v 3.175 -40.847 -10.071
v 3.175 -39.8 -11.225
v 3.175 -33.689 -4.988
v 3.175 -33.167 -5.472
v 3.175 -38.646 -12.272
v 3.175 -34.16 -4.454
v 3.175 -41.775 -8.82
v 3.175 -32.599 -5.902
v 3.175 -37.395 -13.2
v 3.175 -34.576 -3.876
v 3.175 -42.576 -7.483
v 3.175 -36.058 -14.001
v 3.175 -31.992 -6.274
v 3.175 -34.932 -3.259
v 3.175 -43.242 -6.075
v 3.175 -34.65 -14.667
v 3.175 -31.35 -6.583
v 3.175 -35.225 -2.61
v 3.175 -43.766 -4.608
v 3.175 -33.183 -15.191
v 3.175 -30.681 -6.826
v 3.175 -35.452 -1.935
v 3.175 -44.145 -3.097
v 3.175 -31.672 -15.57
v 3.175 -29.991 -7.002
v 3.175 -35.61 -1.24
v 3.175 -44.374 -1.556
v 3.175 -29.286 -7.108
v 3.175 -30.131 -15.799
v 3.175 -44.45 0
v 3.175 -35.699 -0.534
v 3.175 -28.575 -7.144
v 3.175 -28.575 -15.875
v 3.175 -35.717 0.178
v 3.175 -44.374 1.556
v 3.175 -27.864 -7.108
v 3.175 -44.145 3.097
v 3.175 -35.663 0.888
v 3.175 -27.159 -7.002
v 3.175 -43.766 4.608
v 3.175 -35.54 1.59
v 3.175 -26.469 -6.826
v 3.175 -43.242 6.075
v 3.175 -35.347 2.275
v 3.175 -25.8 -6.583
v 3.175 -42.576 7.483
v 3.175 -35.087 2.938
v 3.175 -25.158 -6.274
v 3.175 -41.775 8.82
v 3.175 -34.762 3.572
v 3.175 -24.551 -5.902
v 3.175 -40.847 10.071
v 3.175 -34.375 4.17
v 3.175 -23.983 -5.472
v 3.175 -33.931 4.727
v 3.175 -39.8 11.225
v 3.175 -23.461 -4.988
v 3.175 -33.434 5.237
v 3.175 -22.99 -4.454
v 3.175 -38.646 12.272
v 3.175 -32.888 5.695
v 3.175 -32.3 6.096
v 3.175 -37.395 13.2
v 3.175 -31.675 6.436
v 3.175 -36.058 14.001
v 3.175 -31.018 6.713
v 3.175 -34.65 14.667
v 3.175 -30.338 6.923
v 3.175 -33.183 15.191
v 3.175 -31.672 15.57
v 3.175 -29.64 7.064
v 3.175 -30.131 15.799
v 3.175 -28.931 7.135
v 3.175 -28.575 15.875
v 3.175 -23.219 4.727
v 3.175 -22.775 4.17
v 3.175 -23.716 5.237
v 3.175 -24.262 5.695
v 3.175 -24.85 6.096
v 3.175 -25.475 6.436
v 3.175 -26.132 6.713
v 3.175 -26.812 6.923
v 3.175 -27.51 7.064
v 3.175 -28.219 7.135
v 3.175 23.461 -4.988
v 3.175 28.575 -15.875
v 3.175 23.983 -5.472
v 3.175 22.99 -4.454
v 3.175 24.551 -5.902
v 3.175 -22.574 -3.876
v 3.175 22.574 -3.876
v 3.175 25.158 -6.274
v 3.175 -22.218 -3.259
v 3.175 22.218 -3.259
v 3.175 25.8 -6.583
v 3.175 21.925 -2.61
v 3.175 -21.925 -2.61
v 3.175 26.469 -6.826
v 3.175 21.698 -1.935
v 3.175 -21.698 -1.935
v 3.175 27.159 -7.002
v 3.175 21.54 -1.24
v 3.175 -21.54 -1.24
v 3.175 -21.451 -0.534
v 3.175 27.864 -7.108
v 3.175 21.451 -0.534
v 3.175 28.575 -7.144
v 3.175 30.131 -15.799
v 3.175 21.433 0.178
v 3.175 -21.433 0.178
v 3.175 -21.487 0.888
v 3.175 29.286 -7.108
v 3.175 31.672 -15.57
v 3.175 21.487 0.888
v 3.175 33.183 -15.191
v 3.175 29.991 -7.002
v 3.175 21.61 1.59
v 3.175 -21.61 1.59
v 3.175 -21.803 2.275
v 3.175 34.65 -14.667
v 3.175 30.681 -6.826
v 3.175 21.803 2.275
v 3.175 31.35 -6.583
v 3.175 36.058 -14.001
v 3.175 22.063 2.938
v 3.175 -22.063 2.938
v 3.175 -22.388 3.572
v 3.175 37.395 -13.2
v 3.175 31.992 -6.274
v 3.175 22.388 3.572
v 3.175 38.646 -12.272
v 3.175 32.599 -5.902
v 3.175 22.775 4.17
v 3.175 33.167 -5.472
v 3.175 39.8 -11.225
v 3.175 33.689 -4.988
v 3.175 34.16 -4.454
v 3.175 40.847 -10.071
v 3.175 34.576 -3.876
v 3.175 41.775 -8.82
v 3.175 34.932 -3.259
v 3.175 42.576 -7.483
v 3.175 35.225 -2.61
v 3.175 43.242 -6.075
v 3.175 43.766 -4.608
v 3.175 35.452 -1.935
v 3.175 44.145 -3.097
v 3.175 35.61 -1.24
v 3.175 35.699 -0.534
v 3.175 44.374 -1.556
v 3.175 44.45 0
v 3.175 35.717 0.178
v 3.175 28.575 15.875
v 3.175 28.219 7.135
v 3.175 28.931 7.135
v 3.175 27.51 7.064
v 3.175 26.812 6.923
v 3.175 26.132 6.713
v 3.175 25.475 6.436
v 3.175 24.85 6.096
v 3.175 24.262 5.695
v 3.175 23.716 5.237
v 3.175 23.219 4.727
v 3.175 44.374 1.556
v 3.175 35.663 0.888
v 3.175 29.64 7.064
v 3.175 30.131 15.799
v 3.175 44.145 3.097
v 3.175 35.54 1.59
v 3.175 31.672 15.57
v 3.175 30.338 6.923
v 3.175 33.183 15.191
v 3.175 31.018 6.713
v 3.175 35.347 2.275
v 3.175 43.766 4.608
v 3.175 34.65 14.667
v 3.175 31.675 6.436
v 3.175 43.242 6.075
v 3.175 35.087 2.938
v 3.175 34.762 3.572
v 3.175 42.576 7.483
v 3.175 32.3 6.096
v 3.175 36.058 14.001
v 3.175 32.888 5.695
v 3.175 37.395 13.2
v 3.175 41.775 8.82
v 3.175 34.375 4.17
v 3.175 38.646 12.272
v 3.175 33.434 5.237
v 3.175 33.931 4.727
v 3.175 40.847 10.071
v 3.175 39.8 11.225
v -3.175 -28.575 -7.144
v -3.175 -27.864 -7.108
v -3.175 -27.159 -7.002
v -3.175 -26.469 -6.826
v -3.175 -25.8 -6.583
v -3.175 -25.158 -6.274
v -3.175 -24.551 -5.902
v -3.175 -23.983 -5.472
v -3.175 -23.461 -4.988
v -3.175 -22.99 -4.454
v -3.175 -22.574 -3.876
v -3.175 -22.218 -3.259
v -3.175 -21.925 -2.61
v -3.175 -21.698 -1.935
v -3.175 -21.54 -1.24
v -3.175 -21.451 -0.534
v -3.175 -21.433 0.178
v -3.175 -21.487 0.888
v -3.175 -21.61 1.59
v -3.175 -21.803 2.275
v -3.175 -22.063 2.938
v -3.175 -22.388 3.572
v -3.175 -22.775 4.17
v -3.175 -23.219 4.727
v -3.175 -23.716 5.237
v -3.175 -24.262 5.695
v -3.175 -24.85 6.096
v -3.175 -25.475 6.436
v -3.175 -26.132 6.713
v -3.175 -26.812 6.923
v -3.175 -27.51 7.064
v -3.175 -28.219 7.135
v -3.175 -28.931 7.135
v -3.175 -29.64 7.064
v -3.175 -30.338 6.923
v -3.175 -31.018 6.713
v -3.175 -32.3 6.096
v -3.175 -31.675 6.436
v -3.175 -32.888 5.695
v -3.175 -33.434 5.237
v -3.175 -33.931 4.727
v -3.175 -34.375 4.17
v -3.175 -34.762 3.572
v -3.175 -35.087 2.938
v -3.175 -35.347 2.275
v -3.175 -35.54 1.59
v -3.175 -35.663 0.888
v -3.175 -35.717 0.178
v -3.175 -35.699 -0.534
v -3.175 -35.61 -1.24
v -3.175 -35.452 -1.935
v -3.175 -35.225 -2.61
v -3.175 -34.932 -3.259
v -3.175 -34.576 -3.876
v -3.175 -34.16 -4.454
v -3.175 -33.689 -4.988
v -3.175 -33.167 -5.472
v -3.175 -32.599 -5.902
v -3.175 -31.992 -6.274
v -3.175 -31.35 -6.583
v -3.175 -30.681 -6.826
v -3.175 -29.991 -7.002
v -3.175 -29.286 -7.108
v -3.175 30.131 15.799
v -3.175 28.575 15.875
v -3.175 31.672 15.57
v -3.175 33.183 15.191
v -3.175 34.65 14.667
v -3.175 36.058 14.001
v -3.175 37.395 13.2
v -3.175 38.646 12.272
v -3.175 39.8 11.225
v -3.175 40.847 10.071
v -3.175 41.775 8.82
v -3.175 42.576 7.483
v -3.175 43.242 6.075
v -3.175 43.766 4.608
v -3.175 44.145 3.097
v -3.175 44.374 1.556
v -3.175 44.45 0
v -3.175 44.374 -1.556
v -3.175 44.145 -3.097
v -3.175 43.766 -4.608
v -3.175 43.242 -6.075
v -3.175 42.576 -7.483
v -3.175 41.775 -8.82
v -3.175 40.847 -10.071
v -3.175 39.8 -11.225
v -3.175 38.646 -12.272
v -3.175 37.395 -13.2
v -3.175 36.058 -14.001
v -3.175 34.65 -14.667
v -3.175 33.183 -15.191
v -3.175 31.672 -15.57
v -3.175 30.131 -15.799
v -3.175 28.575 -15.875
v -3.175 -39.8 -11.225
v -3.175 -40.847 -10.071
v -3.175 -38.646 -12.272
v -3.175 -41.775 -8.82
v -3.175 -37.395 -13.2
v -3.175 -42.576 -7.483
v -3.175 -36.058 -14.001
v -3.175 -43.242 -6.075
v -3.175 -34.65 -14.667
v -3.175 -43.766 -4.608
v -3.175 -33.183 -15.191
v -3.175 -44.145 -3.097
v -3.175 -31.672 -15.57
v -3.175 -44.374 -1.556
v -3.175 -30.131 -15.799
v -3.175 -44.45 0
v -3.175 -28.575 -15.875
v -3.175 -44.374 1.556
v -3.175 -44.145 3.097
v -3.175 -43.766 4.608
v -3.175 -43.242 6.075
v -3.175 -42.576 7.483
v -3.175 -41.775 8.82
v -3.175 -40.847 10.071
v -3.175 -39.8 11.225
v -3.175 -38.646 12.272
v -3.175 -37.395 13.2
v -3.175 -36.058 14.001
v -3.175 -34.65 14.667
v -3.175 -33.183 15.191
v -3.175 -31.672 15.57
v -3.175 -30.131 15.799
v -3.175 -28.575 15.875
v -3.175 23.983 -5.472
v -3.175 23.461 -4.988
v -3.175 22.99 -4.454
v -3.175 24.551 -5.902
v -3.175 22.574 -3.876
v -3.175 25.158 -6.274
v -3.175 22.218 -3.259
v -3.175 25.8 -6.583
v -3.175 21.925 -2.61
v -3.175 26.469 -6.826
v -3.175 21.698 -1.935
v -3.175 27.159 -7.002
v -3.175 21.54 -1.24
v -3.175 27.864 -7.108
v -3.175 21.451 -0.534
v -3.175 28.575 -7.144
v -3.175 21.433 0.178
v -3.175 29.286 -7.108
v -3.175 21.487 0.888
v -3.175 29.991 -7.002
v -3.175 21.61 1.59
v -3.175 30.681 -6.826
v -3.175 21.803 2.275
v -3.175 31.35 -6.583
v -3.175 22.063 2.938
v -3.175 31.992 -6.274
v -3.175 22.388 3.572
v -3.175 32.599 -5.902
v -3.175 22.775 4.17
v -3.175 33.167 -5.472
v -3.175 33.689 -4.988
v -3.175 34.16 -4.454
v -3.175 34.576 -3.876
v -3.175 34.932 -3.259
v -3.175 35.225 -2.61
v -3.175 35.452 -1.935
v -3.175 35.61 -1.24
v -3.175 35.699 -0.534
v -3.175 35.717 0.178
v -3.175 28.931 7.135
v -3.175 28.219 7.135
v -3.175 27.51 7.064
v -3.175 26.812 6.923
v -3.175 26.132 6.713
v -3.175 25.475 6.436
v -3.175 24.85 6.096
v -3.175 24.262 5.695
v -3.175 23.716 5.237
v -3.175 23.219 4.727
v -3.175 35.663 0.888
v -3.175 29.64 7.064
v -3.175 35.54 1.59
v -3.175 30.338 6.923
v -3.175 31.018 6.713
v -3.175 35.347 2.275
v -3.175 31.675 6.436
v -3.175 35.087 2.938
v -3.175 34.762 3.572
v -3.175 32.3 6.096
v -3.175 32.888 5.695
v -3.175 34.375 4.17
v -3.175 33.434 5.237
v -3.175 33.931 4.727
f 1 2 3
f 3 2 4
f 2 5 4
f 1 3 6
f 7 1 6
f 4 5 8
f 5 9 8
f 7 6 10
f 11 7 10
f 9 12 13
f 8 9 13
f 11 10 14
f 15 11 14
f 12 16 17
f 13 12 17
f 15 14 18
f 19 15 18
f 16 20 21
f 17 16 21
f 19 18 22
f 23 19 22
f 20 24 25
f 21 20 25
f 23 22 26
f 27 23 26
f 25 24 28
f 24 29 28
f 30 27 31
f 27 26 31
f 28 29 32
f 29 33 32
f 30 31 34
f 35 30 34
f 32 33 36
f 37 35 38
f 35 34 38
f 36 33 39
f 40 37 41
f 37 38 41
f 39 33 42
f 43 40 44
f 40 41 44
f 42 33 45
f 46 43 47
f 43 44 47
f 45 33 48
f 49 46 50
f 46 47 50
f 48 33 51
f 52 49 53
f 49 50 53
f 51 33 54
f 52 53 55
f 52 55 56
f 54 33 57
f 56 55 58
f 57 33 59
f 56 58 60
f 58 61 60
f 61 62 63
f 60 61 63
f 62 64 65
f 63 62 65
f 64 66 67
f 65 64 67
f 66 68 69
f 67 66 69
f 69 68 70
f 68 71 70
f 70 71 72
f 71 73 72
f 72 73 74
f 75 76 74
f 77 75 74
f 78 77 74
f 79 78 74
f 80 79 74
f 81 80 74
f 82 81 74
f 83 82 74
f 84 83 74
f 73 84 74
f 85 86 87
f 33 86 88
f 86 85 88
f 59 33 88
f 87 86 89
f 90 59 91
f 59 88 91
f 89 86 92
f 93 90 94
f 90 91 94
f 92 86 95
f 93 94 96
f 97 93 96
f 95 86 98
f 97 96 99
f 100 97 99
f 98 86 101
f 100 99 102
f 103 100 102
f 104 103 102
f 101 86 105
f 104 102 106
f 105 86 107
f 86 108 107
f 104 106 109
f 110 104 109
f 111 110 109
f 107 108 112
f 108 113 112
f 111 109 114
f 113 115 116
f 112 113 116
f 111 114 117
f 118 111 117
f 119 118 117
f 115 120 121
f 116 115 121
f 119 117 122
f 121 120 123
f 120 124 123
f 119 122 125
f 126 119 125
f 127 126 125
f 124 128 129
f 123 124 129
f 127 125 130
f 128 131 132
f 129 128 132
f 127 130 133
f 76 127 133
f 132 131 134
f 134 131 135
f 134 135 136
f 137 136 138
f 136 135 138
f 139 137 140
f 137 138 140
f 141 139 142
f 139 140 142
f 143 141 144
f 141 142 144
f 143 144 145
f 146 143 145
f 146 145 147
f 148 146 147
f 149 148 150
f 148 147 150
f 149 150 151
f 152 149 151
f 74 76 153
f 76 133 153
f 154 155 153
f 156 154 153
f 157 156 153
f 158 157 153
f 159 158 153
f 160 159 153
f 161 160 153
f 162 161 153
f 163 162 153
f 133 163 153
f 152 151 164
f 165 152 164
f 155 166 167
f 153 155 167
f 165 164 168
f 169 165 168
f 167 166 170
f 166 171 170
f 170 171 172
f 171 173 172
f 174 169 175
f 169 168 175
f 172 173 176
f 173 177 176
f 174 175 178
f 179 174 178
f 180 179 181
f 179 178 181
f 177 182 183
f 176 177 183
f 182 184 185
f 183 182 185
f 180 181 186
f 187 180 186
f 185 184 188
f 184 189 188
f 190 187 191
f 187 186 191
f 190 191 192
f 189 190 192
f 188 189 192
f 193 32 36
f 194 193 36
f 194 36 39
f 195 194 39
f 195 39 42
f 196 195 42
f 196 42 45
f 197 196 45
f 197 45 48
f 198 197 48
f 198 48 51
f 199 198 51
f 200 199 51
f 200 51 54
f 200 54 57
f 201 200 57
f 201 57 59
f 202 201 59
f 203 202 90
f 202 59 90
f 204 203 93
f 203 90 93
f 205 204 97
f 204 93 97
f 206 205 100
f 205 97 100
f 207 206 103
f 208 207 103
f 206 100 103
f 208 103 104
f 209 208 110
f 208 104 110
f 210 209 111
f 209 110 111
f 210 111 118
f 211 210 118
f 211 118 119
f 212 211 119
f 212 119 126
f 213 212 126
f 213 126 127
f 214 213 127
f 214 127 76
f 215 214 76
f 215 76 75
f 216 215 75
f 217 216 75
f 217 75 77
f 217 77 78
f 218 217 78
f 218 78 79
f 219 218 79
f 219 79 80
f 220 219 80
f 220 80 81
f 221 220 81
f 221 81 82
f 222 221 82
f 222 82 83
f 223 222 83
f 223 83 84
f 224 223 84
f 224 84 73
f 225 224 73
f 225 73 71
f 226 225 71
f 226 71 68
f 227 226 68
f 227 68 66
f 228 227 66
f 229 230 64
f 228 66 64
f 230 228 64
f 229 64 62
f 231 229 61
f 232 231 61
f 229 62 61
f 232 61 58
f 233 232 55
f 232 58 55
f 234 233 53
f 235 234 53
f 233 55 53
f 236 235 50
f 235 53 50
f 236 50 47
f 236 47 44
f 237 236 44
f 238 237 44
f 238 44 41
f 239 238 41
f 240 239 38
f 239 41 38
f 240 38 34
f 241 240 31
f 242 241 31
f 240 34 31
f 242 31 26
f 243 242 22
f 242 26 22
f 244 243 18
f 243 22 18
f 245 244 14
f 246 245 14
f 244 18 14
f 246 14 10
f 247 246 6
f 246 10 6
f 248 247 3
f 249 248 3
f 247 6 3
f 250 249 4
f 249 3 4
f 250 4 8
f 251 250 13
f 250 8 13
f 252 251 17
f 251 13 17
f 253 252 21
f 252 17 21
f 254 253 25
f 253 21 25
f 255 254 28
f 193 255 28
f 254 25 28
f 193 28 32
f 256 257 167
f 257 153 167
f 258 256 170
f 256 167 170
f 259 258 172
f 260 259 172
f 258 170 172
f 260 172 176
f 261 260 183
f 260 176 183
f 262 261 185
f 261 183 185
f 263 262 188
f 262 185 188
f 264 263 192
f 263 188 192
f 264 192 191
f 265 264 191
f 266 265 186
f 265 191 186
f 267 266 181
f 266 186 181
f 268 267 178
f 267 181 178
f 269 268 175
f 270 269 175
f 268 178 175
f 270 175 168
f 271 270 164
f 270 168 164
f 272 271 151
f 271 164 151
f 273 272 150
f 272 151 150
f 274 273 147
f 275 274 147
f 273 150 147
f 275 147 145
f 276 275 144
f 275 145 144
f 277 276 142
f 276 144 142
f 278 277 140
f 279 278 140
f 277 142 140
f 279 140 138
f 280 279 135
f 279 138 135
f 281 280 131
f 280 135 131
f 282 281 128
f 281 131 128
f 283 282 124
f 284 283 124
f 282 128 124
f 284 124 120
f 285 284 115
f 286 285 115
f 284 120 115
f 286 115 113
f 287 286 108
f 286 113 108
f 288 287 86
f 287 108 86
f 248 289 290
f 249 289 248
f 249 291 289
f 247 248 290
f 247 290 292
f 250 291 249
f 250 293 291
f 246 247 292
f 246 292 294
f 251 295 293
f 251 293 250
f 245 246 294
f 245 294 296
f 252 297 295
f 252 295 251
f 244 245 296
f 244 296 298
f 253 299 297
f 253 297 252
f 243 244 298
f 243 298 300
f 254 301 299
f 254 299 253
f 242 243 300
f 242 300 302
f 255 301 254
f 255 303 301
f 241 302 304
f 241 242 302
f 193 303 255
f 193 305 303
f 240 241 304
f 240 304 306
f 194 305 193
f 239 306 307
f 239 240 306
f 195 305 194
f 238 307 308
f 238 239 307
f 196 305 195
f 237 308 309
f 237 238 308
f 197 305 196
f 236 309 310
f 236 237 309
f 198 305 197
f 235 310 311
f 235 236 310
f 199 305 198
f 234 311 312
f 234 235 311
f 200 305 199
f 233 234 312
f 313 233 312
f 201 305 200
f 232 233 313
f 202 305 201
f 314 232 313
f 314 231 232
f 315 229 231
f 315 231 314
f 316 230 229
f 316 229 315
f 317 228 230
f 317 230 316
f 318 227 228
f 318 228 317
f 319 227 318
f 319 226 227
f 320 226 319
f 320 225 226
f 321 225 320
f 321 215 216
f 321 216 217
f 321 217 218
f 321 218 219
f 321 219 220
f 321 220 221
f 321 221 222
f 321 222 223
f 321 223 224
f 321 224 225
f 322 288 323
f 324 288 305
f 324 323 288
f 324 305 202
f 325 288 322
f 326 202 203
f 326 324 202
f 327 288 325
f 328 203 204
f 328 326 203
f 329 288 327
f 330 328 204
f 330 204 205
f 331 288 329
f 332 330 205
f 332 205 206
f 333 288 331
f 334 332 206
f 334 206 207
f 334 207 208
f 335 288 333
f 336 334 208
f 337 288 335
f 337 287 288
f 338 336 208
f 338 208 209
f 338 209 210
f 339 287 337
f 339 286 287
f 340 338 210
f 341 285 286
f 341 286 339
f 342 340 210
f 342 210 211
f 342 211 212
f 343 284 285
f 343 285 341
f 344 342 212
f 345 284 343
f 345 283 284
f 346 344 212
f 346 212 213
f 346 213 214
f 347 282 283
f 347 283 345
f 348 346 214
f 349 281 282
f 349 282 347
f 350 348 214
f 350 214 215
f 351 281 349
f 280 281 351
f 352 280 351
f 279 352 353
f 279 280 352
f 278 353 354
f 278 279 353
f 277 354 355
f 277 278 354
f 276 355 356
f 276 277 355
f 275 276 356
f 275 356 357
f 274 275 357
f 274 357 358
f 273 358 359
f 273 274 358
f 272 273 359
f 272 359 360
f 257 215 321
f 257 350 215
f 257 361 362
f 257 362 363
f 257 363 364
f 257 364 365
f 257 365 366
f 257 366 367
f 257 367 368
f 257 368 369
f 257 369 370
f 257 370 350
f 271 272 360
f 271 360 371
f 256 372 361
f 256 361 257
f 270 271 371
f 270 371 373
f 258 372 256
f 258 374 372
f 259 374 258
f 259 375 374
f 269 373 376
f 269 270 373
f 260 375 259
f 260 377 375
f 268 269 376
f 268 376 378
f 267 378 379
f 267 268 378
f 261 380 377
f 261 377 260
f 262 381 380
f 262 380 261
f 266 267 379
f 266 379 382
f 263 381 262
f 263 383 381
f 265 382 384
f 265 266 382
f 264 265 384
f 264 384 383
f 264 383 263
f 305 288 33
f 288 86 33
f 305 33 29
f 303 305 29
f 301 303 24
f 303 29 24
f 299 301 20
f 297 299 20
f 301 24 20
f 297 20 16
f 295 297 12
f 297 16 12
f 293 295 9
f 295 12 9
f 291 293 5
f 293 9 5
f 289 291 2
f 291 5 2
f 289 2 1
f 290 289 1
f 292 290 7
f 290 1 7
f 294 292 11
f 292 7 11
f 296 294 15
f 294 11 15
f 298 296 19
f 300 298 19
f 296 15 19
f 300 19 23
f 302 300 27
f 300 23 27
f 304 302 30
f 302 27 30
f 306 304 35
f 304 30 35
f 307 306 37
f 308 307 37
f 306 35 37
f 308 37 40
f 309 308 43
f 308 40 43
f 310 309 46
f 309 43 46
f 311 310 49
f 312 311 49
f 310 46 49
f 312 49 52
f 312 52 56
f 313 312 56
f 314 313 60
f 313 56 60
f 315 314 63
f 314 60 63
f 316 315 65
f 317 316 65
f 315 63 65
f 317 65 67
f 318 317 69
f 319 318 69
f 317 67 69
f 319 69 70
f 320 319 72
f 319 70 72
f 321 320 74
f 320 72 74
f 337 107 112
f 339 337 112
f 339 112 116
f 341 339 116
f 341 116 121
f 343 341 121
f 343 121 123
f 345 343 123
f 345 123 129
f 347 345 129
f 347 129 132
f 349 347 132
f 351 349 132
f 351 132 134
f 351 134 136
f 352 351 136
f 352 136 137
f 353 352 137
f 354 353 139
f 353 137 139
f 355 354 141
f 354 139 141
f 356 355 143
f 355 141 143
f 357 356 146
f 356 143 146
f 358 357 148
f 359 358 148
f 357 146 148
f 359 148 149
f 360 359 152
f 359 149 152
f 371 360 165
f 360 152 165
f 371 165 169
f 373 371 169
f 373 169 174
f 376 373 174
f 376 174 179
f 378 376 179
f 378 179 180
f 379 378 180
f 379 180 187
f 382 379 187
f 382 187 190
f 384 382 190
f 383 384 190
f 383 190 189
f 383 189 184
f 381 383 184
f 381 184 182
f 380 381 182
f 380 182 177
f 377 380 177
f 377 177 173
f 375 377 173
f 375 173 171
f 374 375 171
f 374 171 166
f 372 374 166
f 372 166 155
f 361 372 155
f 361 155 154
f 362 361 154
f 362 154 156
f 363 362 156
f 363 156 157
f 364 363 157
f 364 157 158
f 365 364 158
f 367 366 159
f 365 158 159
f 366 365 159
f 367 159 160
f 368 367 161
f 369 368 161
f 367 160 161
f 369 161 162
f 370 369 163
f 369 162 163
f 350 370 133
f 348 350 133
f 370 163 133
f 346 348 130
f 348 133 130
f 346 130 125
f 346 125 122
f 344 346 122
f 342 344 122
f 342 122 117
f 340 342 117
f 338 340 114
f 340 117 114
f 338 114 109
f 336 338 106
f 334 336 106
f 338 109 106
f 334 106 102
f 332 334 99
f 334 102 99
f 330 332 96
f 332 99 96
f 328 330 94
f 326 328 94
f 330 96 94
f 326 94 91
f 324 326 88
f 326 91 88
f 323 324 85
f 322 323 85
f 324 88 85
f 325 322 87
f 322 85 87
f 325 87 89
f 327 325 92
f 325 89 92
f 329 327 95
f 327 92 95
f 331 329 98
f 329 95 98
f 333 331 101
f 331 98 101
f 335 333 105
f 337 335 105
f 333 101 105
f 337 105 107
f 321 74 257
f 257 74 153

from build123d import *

# Parameters (mm, degrees)
BOSS_EXTRUDE1_DEPTH = 3.175
CUT_EXTRUDE1_REACH  = 8.35
SKETCH2_R           = 7.14375


with BuildPart() as part:
    # Sketch1 → Boss-Extrude1 (new body, symmetric)
    with BuildSketch(Plane(origin=(0, 0, 0), x_dir=(0, 0, -1), z_dir=(1, 0, 0))):
        with BuildLine():
            Line((-15.875, -28.575), (-15.875, 28.575))
            ThreePointArc((-15.875, 28.575), (0, 44.45), (15.875, 28.575))
            Line((15.875, 28.575), (15.875, -28.575))
            ThreePointArc((15.875, -28.575), (0, -44.45), (-15.875, -28.575))
        make_face()
    extrude(amount=BOSS_EXTRUDE1_DEPTH, both=True)

    # Sketch2 → Cut-Extrude1 (cut, up to next)
    with BuildSketch(Plane(origin=(3.175, 0, 0), x_dir=(0, 0, -1), z_dir=(1, 0, 0)), mode=Mode.PRIVATE) as cut_extrude1_sk1:
        with Locations((0, 28.575)):
            Circle(SKETCH2_R)
    cut_extrude1_tool1 = extrude(cut_extrude1_sk1.sketch, amount=-CUT_EXTRUDE1_REACH, mode=Mode.PRIVATE) & part.part
    add(cut_extrude1_tool1.solids().sort_by_distance((3.175, 28.575, 0))[0], mode=Mode.SUBTRACT)
    # Sketch2 → Cut-Extrude1 (cut, up to next)
    with BuildSketch(Plane(origin=(3.175, 0, 0), x_dir=(0, 0, -1), z_dir=(1, 0, 0)), mode=Mode.PRIVATE) as cut_extrude1_sk2:
        with Locations((0, -28.575)):
            Circle(SKETCH2_R)
    cut_extrude1_tool2 = extrude(cut_extrude1_sk2.sketch, amount=-CUT_EXTRUDE1_REACH, mode=Mode.PRIVATE) & part.part
    add(cut_extrude1_tool2.solids().sort_by_distance((3.175, -28.575, 0))[0], mode=Mode.SUBTRACT)


solid = part.part
